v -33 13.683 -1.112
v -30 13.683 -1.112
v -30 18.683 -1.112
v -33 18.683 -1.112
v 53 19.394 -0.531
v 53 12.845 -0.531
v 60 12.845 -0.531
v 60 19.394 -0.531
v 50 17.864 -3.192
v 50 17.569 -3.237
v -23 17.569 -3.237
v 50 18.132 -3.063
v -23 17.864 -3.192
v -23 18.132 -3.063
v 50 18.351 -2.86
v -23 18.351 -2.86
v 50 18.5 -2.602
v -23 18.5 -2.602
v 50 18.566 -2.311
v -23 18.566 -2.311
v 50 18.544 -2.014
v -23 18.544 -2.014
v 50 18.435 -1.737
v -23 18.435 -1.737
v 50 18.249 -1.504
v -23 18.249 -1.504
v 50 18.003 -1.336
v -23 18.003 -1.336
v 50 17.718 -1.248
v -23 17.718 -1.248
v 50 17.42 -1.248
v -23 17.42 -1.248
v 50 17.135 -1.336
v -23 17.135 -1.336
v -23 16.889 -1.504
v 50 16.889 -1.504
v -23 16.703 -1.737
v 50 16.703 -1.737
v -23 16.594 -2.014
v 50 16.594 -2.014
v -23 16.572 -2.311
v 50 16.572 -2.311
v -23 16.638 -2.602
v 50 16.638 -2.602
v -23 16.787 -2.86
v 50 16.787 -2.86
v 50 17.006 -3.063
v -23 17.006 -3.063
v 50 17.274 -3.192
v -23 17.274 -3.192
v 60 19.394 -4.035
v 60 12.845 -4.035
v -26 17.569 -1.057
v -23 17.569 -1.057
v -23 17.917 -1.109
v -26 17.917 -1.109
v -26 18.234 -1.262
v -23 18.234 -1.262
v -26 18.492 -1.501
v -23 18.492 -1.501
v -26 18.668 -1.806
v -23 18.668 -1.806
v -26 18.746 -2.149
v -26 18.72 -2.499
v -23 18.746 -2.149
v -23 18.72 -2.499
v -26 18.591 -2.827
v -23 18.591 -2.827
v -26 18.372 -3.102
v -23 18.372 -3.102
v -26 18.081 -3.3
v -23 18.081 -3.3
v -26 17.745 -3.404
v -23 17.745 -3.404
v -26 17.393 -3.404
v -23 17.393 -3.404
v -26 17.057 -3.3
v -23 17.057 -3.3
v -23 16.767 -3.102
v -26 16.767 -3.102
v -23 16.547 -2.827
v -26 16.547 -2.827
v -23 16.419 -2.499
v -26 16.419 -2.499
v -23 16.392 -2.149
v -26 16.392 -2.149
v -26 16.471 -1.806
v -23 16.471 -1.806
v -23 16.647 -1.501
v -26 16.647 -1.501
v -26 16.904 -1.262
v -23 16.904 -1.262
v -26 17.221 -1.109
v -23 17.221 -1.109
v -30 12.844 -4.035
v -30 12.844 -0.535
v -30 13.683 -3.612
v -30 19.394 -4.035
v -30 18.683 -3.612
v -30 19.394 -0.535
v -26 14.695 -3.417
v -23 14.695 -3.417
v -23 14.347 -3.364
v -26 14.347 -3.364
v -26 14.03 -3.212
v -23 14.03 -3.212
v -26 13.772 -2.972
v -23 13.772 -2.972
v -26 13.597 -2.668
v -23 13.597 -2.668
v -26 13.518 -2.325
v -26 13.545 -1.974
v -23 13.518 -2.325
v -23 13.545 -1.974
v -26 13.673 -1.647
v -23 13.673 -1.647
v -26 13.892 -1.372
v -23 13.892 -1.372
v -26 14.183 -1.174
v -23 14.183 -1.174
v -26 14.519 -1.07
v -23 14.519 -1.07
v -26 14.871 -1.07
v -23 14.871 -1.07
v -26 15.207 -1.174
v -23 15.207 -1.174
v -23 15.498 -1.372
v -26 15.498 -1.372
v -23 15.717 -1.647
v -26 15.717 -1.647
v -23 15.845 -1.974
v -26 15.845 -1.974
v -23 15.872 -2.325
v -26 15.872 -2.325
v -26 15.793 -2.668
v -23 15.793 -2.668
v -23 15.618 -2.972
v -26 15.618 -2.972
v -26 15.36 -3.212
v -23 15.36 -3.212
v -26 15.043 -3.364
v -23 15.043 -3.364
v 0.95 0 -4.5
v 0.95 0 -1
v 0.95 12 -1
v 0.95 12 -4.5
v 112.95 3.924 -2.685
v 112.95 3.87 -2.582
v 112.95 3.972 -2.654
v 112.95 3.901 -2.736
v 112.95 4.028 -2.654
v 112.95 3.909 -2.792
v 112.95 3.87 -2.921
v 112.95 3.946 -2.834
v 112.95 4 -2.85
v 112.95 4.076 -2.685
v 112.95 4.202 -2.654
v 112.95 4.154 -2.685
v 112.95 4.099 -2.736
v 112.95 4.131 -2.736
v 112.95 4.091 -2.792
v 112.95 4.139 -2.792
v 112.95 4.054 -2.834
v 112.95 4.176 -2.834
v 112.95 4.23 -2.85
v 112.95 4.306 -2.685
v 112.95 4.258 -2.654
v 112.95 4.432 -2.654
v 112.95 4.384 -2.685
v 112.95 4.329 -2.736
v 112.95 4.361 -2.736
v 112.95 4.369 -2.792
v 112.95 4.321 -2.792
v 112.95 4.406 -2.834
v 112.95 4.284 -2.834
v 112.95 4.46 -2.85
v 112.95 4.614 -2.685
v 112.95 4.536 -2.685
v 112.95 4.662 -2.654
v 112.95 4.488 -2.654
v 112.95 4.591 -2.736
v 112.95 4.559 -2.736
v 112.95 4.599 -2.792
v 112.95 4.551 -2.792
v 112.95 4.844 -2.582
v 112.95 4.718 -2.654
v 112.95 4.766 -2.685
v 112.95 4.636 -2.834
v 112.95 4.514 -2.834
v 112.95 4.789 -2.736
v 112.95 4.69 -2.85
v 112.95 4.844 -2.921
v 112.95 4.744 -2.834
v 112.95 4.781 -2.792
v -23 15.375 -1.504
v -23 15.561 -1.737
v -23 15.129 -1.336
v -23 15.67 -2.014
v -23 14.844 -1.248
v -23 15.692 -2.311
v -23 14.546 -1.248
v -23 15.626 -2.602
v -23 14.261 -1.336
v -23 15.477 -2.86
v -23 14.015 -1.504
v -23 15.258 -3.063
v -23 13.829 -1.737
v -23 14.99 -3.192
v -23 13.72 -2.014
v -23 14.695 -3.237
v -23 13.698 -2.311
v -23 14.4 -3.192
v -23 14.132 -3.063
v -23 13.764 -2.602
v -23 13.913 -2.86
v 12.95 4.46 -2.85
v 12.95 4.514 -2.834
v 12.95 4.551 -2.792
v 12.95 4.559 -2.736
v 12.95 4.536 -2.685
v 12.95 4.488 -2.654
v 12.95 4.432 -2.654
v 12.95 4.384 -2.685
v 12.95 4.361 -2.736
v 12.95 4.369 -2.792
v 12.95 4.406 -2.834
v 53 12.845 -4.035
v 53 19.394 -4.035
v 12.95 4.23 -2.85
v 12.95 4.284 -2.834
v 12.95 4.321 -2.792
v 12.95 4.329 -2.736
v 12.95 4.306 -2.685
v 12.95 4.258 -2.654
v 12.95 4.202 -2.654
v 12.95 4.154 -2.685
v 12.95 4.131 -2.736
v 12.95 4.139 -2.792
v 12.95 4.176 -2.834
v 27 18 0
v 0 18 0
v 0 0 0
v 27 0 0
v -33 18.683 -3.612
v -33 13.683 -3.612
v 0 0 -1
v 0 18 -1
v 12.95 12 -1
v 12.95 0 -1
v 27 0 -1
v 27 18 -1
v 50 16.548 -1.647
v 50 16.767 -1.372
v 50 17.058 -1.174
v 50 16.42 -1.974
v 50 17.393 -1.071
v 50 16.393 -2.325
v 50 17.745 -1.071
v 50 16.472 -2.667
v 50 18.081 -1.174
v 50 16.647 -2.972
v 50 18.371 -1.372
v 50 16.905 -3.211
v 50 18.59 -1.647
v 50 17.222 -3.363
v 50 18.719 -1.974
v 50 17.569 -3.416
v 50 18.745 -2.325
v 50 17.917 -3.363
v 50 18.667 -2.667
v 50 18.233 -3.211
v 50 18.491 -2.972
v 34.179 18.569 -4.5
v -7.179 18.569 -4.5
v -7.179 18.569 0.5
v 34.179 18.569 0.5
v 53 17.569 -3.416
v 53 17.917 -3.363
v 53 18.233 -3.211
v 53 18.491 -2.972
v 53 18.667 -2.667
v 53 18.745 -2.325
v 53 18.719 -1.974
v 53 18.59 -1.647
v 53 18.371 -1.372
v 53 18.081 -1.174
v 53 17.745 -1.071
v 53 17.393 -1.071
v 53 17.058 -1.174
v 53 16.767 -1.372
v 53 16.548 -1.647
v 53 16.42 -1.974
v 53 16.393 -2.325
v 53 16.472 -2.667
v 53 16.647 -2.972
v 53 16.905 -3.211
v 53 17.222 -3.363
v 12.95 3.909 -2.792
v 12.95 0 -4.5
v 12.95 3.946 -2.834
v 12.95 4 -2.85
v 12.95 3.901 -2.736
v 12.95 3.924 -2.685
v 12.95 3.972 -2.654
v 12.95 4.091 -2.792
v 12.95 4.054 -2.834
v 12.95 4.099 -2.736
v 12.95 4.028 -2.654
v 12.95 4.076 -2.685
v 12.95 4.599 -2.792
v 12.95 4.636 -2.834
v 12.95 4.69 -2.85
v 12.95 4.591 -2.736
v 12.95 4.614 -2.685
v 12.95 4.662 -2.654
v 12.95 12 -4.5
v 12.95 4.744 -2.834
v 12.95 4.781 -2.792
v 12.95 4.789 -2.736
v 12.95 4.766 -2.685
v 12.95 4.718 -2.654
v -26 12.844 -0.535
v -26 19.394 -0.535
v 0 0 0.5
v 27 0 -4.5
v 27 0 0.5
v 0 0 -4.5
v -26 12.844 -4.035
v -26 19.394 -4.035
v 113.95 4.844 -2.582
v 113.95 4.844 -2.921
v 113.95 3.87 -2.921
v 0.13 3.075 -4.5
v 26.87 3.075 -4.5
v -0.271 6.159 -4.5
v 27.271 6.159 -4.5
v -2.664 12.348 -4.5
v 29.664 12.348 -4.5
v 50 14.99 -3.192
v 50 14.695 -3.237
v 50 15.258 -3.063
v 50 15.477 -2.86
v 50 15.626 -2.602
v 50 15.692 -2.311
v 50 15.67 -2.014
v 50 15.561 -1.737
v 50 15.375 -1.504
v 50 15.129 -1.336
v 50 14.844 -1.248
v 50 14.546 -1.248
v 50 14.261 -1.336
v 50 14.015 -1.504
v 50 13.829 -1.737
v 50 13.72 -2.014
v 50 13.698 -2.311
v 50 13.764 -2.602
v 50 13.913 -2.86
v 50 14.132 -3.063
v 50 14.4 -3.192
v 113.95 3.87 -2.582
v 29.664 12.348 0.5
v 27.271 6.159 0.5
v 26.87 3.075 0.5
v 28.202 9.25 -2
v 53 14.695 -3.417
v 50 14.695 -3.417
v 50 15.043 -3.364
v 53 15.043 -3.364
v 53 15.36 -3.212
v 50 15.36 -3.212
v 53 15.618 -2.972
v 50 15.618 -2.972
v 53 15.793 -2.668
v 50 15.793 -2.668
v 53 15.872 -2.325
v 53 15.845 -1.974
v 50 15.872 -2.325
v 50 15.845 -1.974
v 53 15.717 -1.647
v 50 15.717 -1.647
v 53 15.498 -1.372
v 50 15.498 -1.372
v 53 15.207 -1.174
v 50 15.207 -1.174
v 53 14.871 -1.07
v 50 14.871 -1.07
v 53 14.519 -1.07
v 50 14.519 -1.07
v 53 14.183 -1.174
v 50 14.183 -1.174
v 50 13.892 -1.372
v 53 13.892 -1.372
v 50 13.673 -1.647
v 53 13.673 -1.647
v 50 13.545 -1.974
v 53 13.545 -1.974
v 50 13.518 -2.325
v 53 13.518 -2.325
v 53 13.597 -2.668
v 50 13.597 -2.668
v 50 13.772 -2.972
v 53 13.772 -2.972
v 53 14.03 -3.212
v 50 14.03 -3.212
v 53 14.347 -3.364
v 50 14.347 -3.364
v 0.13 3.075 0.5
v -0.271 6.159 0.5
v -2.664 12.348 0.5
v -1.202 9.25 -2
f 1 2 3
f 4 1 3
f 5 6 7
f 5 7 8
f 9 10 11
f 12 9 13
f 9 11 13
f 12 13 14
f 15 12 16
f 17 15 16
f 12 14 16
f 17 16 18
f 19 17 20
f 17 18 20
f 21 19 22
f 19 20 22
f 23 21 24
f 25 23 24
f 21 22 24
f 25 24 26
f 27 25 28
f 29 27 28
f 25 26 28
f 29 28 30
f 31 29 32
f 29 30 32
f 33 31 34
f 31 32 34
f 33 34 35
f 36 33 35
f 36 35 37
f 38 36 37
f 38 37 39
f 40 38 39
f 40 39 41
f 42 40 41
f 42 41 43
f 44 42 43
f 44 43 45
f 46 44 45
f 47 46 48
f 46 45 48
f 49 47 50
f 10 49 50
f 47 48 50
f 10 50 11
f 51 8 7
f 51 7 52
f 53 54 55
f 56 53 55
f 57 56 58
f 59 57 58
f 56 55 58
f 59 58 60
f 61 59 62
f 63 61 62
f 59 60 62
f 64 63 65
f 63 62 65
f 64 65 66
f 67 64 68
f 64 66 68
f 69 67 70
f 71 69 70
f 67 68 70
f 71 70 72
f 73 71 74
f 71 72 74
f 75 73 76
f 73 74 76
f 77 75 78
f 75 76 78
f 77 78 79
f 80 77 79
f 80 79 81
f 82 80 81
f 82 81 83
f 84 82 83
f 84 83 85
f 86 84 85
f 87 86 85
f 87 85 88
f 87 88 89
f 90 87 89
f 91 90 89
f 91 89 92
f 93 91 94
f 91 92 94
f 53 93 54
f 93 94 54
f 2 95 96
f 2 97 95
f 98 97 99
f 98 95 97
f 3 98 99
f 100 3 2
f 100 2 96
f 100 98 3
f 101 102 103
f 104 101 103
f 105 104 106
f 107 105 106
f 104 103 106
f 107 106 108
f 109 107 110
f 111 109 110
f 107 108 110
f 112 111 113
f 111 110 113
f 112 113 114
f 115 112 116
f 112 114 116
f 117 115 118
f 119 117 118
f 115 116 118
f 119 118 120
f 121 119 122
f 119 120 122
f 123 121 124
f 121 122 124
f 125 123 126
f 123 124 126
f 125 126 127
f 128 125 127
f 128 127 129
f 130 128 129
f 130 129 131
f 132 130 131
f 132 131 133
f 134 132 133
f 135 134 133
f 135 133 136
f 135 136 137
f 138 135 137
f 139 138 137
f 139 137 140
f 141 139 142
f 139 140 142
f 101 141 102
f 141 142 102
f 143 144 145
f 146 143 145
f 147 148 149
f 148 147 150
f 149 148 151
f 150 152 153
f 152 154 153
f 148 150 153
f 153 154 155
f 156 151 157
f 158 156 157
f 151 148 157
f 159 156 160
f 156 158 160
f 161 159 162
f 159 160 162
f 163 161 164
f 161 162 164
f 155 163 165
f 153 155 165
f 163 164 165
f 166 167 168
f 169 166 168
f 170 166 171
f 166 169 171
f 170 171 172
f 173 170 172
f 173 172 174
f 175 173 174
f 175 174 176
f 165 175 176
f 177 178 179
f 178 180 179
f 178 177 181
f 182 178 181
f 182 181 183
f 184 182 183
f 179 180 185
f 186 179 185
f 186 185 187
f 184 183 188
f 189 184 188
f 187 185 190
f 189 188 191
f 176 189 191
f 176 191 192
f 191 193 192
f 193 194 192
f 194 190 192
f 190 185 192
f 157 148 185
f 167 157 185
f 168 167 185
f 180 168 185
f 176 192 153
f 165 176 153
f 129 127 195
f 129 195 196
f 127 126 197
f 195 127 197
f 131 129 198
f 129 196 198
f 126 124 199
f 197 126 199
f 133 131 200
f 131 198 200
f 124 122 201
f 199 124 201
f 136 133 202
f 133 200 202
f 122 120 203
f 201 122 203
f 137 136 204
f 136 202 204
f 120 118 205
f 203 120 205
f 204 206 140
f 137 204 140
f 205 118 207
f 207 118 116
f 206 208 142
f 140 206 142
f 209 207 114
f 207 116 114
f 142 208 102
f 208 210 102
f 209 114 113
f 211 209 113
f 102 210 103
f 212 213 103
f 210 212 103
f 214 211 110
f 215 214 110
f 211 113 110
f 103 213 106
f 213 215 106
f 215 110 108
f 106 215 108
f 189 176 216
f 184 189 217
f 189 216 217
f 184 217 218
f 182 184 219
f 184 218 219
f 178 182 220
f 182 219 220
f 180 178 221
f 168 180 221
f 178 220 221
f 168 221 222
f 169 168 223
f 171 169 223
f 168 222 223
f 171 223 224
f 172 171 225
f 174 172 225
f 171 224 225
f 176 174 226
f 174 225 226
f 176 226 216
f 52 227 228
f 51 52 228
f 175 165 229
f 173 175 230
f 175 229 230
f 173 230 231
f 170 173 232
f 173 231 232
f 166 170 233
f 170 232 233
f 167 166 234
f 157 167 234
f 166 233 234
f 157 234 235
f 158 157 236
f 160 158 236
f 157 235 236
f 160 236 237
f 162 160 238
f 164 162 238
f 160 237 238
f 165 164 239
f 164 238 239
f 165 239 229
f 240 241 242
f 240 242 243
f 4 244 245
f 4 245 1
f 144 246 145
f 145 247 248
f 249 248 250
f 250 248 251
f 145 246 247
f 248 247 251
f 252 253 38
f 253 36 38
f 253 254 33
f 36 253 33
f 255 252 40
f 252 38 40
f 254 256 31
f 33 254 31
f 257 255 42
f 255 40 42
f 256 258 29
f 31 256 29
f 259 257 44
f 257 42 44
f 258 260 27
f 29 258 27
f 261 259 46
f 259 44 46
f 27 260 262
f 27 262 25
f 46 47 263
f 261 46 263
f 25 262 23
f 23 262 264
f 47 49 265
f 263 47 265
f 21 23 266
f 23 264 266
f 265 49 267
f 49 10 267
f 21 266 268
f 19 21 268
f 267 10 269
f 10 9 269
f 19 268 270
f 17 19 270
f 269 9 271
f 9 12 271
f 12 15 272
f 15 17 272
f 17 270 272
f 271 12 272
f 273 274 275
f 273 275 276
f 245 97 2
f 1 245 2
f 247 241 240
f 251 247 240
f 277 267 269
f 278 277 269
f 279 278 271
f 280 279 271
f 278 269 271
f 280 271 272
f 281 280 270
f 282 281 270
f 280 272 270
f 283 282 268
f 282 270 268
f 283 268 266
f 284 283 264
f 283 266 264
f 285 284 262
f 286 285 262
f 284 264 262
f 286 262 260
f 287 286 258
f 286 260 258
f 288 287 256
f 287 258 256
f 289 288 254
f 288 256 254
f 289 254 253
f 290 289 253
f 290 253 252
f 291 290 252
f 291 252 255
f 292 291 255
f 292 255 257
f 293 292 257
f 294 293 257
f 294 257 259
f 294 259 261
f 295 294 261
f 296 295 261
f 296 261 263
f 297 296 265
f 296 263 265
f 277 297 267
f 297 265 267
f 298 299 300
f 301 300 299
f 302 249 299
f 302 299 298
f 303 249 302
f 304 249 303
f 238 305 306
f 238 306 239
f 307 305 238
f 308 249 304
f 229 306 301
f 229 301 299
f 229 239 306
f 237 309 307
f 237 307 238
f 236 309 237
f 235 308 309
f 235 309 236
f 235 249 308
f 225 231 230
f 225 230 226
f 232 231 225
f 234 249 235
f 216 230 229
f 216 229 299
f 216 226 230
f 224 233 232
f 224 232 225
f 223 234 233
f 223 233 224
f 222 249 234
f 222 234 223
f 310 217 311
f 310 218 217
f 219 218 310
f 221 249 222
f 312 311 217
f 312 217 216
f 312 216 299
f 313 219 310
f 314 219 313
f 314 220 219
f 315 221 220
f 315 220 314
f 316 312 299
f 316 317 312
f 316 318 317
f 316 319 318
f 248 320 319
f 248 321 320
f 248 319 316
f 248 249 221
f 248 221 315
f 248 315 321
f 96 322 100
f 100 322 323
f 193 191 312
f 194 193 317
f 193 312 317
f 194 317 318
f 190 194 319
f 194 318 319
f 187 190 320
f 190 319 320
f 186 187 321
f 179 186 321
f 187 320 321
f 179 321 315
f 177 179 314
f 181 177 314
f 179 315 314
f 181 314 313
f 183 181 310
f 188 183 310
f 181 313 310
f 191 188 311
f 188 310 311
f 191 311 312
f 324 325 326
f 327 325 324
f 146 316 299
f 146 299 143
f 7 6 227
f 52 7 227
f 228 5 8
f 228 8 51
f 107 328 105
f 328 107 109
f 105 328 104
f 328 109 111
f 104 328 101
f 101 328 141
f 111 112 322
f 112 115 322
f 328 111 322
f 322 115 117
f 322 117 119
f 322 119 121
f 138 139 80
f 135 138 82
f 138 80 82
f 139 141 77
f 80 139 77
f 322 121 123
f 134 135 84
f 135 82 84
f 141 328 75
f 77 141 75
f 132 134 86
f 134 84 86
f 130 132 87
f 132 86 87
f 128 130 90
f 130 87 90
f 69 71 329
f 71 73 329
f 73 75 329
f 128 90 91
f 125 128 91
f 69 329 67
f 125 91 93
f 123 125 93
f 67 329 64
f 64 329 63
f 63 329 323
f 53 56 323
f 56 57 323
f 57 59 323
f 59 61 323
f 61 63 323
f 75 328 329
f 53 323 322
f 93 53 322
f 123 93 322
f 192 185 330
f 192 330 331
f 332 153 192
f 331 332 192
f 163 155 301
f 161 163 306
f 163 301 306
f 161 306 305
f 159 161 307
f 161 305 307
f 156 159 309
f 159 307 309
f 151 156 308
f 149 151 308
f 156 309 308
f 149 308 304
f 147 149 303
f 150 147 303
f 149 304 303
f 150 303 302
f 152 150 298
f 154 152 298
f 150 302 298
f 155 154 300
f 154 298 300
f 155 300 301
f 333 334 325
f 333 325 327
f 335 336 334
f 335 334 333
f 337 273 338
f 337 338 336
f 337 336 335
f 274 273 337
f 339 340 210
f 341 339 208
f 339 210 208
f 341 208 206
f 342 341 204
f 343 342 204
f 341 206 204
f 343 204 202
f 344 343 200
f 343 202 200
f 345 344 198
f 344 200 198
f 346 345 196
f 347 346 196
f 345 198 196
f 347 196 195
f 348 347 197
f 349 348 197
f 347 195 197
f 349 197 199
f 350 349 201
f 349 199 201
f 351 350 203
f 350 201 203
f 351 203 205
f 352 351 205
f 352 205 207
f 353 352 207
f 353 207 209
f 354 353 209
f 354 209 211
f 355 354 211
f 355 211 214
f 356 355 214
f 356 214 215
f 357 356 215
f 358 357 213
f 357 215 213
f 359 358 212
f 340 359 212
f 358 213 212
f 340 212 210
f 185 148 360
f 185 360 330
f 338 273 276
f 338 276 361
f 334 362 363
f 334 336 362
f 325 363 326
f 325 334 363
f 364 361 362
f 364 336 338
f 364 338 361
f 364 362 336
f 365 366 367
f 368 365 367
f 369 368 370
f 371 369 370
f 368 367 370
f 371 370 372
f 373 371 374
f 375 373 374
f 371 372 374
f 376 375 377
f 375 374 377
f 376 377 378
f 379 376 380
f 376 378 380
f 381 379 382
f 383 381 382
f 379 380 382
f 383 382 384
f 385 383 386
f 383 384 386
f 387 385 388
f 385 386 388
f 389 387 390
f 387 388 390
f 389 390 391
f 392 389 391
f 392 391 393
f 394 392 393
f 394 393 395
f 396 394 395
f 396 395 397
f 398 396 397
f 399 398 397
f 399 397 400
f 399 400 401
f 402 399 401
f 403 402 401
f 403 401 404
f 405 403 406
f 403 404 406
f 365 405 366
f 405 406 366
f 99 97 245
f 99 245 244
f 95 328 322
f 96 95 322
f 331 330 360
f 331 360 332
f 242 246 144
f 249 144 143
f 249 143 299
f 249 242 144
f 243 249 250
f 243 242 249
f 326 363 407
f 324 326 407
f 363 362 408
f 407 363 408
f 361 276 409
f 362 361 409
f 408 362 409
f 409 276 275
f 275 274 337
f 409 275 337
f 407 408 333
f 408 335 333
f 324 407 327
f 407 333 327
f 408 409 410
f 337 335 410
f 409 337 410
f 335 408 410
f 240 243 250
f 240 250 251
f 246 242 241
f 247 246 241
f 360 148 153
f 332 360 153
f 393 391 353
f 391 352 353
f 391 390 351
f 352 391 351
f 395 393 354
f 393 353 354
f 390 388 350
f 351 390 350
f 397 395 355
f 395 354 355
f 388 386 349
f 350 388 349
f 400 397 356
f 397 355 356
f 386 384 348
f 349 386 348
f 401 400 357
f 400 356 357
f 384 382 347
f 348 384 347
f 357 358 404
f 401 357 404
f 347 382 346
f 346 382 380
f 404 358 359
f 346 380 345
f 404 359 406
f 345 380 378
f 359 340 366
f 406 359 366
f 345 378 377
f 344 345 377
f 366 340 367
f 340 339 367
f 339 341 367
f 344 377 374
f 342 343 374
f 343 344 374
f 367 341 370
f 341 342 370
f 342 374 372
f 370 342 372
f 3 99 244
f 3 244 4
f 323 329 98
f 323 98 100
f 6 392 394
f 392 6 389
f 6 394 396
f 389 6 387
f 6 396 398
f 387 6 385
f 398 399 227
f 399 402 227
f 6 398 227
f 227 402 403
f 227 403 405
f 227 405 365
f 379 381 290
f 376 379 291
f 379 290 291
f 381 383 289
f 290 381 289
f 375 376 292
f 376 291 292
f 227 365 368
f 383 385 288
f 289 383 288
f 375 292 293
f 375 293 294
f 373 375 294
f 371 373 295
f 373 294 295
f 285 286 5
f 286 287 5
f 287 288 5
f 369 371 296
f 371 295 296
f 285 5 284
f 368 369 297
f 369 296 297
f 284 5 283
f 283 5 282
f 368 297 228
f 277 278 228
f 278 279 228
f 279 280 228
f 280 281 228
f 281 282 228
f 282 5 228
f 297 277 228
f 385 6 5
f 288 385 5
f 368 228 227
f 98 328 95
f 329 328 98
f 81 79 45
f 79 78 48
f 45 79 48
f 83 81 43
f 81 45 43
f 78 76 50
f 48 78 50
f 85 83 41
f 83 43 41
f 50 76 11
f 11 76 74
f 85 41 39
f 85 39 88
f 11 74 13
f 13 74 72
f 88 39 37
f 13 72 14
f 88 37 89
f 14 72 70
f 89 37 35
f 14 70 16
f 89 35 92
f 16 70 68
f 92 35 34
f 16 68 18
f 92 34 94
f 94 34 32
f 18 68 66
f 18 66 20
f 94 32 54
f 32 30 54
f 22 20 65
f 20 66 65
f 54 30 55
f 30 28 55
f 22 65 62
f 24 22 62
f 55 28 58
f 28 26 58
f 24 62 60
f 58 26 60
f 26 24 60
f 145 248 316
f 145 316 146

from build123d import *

# Parameters (mm, degrees)
SKETCH1_W                   = 27
SKETCH1_H                   = 18
BOSS_EXTRUDE8_DEPTH         = 1
SKETCH8_W                   = 12
SKETCH8_H                   = 12
BOSS_EXTRUDE10_DEPTH        = 3.5
BOSS_EXTRUDE11_DEPTH        = 23
BOSS_EXTRUDE11_DEPTH_BACK   = 50
SKETCH9_R                   = 1
BOSS_EXTRUDE11_2_DEPTH      = 23
BOSS_EXTRUDE11_2_DEPTH_BACK = 50
SKETCH10_R                  = 1.179103969
SKETCH10_R_2                = 1.18
BOSS_EXTRUDE12_DEPTH        = 3
SKETCH11_R                  = 1.18
BOSS_EXTRUDE13_DEPTH        = 3
SKETCH12_W                  = 3.503549992
SKETCH12_H                  = 6.548691573
BOSS_EXTRUDE14_DEPTH        = 7
SKETCH13_W                  = 3.5
SKETCH13_H                  = 6.55
BOSS_EXTRUDE15_DEPTH        = 4
SKETCH14_W                  = 2.5
SKETCH14_H                  = 5
BOSS_EXTRUDE16_DEPTH        = 3
SKETCH15_R                  = 0.1
BOSS_EXTRUDE20_DEPTH        = 100
SKETCH16_W                  = 0.338953989
SKETCH16_H                  = 0.974492718
BOSS_EXTRUDE21_DEPTH        = 1
SKETCH17_W                  = 12
SKETCH17_H                  = 12
BOSS_EXTRUDE22_DEPTH        = 5


with BuildPart() as part:
    # Sketch1 → Boss-Extrude8 (new body)
    with BuildSketch(Plane.XY):
        with Locations((13.5, 9)):
            Rectangle(SKETCH1_W, SKETCH1_H)
    extrude(amount=-BOSS_EXTRUDE8_DEPTH)

    # Sketch8 → Boss-Extrude10 (add)
    with BuildSketch(Plane(origin=(0, 0, -1), x_dir=(-1, 0, 0), z_dir=(0, 0, -1))):
        with Locations((-6.950011558, 6)):
            Rectangle(SKETCH8_W, SKETCH8_H)
    extrude(amount=BOSS_EXTRUDE10_DEPTH)

    # Sketch15 → Boss-Extrude20 (add)
    with BuildSketch(Plane(origin=(12.950011558, 0, 0), x_dir=(0, 0, -1), z_dir=(1, 0, 0))):
        with Locations((2.75, 4.69)):
            Circle(SKETCH15_R)
        with Locations((2.75, 4.46)):
            Circle(SKETCH15_R)
        with Locations((2.75, 4.23)):
            Circle(SKETCH15_R)
        with Locations((2.75, 4)):
            Circle(SKETCH15_R)
    extrude(amount=BOSS_EXTRUDE20_DEPTH)

    # Sketch16 → Boss-Extrude21 (add)
    with BuildSketch(Plane(origin=(112.950011558, 0, 0), x_dir=(0, 0, -1), z_dir=(1, 0, 0))):
        with Locations((2.751438269, 4.356787815)):
            Rectangle(SKETCH16_W, SKETCH16_H)
    extrude(amount=BOSS_EXTRUDE21_DEPTH)


with BuildPart() as body_2:
    # Sketch9 → Boss-Extrude11 (new, two sides: drawn at the far end of the back side and taken through both)
    with BuildSketch(Plane(origin=(27, 0, 0), x_dir=(0, 0, -1), z_dir=(1, 0, 0)).offset(-BOSS_EXTRUDE11_DEPTH_BACK)):
        with Locations((2.236693828, 17.569174757)):
            Circle(SKETCH9_R)
    extrude(amount=BOSS_EXTRUDE11_DEPTH + BOSS_EXTRUDE11_DEPTH_BACK)



with BuildPart() as body_3:
    # Sketch9 → Boss-Extrude11 2 (new, two sides: drawn at the far end of the back side and taken through both)
    with BuildSketch(Plane(origin=(27, 0, 0), x_dir=(0, 0, -1), z_dir=(1, 0, 0)).offset(-BOSS_EXTRUDE11_2_DEPTH_BACK)):
        with Locations((2.236693828, 14.695041609)):
            Circle(SKETCH9_R)
    extrude(amount=BOSS_EXTRUDE11_2_DEPTH + BOSS_EXTRUDE11_2_DEPTH_BACK)


with BuildPart() as body_2_1:
    add(body_2.part)

    add(body_3.part)  # Boss-Extrude12 merges body 3
    # Sketch10 → Boss-Extrude12 (add)
    with BuildSketch(Plane(origin=(50, 0, 0), x_dir=(0, 0, -1), z_dir=(1, 0, 0))):
        with Locations((2.236693828, 17.569174757)):
            Circle(SKETCH10_R)
        with Locations((2.236693828, 14.695041609)):
            Circle(SKETCH10_R_2)
    extrude(amount=BOSS_EXTRUDE12_DEPTH)

    # Sketch11 → Boss-Extrude13 (add)
    with BuildSketch(Plane.ZY.offset(23)):
        with Locations((-2.236693828, 17.569174757)):
            Circle(SKETCH11_R)
        with Locations(Location((-2.236693828, 14.695041609, 0), (0, 0, 180))):
            Circle(SKETCH11_R)
    extrude(amount=BOSS_EXTRUDE13_DEPTH)

    # Sketch12 → Boss-Extrude14 (add)
    with BuildSketch(Plane(origin=(53, 0, 0), x_dir=(0, 0, -1), z_dir=(1, 0, 0))):
        with Locations((2.282743458, 16.119739699)):
            Rectangle(SKETCH12_W, SKETCH12_H)
    extrude(amount=BOSS_EXTRUDE14_DEPTH)

    # Sketch13 → Boss-Extrude15 (add)
    with BuildSketch(Plane.ZY.offset(26)):
        with Locations((-2.284518454, 16.119085485)):
            Rectangle(SKETCH13_W, SKETCH13_H)
    extrude(amount=BOSS_EXTRUDE15_DEPTH)

    # Sketch14 → Boss-Extrude16 (add)
    with BuildSketch(Plane.ZY.offset(30)):
        with Locations((-2.361988806, 16.182652091)):
            Rectangle(SKETCH14_W, SKETCH14_H)
    extrude(amount=BOSS_EXTRUDE16_DEPTH)


with BuildPart() as body_3_2:
    # Sketch17 → Boss-Extrude22 (new body)
    with BuildSketch(Plane(origin=(0, 0, -4.5), x_dir=(-1, 0, 0), z_dir=(0, 0, -1))):
        with BuildLine():
            add(Edge.make_bspline(
                [(-34.179396659, 18.569174757), (-25.814861156, 9.21461033), (-27, 0)],
                knots=[0, 0, 0, 0.640923346, 0.640923346, 0.640923346], degree=2))
            Line((-27, 0), (-12.950011558, 0))
            Line((-12.950011558, 0), (-12.950011558, 12))
            Line((-12.950011558, 12), (-0.950011558, 12))
            Line((-0.950011558, 12), (-0.950011558, 0))
            Line((-0.950011558, 0), (0, 0))
            add(Edge.make_bspline(
                [(7.179396659, 18.569174757), (-1.185138844, 9.21461033), (0, 0)],
                knots=[0, 0, 0, 0.640923346, 0.640923346, 0.640923346], degree=2))
            Line((7.179396659, 18.569174757), (0, 18.569174757))
            Line((0, 18.569174757), (-27, 18.569174757))
            Line((-27, 18.569174757), (-34.179396659, 18.569174757))
        make_face()
        with Locations((-6.950011558, 6)):
            Rectangle(SKETCH17_W, SKETCH17_H)
    extrude(amount=-BOSS_EXTRUDE22_DEPTH)


solid = Compound([part.part, body_2_1.part, body_3_2.part])
